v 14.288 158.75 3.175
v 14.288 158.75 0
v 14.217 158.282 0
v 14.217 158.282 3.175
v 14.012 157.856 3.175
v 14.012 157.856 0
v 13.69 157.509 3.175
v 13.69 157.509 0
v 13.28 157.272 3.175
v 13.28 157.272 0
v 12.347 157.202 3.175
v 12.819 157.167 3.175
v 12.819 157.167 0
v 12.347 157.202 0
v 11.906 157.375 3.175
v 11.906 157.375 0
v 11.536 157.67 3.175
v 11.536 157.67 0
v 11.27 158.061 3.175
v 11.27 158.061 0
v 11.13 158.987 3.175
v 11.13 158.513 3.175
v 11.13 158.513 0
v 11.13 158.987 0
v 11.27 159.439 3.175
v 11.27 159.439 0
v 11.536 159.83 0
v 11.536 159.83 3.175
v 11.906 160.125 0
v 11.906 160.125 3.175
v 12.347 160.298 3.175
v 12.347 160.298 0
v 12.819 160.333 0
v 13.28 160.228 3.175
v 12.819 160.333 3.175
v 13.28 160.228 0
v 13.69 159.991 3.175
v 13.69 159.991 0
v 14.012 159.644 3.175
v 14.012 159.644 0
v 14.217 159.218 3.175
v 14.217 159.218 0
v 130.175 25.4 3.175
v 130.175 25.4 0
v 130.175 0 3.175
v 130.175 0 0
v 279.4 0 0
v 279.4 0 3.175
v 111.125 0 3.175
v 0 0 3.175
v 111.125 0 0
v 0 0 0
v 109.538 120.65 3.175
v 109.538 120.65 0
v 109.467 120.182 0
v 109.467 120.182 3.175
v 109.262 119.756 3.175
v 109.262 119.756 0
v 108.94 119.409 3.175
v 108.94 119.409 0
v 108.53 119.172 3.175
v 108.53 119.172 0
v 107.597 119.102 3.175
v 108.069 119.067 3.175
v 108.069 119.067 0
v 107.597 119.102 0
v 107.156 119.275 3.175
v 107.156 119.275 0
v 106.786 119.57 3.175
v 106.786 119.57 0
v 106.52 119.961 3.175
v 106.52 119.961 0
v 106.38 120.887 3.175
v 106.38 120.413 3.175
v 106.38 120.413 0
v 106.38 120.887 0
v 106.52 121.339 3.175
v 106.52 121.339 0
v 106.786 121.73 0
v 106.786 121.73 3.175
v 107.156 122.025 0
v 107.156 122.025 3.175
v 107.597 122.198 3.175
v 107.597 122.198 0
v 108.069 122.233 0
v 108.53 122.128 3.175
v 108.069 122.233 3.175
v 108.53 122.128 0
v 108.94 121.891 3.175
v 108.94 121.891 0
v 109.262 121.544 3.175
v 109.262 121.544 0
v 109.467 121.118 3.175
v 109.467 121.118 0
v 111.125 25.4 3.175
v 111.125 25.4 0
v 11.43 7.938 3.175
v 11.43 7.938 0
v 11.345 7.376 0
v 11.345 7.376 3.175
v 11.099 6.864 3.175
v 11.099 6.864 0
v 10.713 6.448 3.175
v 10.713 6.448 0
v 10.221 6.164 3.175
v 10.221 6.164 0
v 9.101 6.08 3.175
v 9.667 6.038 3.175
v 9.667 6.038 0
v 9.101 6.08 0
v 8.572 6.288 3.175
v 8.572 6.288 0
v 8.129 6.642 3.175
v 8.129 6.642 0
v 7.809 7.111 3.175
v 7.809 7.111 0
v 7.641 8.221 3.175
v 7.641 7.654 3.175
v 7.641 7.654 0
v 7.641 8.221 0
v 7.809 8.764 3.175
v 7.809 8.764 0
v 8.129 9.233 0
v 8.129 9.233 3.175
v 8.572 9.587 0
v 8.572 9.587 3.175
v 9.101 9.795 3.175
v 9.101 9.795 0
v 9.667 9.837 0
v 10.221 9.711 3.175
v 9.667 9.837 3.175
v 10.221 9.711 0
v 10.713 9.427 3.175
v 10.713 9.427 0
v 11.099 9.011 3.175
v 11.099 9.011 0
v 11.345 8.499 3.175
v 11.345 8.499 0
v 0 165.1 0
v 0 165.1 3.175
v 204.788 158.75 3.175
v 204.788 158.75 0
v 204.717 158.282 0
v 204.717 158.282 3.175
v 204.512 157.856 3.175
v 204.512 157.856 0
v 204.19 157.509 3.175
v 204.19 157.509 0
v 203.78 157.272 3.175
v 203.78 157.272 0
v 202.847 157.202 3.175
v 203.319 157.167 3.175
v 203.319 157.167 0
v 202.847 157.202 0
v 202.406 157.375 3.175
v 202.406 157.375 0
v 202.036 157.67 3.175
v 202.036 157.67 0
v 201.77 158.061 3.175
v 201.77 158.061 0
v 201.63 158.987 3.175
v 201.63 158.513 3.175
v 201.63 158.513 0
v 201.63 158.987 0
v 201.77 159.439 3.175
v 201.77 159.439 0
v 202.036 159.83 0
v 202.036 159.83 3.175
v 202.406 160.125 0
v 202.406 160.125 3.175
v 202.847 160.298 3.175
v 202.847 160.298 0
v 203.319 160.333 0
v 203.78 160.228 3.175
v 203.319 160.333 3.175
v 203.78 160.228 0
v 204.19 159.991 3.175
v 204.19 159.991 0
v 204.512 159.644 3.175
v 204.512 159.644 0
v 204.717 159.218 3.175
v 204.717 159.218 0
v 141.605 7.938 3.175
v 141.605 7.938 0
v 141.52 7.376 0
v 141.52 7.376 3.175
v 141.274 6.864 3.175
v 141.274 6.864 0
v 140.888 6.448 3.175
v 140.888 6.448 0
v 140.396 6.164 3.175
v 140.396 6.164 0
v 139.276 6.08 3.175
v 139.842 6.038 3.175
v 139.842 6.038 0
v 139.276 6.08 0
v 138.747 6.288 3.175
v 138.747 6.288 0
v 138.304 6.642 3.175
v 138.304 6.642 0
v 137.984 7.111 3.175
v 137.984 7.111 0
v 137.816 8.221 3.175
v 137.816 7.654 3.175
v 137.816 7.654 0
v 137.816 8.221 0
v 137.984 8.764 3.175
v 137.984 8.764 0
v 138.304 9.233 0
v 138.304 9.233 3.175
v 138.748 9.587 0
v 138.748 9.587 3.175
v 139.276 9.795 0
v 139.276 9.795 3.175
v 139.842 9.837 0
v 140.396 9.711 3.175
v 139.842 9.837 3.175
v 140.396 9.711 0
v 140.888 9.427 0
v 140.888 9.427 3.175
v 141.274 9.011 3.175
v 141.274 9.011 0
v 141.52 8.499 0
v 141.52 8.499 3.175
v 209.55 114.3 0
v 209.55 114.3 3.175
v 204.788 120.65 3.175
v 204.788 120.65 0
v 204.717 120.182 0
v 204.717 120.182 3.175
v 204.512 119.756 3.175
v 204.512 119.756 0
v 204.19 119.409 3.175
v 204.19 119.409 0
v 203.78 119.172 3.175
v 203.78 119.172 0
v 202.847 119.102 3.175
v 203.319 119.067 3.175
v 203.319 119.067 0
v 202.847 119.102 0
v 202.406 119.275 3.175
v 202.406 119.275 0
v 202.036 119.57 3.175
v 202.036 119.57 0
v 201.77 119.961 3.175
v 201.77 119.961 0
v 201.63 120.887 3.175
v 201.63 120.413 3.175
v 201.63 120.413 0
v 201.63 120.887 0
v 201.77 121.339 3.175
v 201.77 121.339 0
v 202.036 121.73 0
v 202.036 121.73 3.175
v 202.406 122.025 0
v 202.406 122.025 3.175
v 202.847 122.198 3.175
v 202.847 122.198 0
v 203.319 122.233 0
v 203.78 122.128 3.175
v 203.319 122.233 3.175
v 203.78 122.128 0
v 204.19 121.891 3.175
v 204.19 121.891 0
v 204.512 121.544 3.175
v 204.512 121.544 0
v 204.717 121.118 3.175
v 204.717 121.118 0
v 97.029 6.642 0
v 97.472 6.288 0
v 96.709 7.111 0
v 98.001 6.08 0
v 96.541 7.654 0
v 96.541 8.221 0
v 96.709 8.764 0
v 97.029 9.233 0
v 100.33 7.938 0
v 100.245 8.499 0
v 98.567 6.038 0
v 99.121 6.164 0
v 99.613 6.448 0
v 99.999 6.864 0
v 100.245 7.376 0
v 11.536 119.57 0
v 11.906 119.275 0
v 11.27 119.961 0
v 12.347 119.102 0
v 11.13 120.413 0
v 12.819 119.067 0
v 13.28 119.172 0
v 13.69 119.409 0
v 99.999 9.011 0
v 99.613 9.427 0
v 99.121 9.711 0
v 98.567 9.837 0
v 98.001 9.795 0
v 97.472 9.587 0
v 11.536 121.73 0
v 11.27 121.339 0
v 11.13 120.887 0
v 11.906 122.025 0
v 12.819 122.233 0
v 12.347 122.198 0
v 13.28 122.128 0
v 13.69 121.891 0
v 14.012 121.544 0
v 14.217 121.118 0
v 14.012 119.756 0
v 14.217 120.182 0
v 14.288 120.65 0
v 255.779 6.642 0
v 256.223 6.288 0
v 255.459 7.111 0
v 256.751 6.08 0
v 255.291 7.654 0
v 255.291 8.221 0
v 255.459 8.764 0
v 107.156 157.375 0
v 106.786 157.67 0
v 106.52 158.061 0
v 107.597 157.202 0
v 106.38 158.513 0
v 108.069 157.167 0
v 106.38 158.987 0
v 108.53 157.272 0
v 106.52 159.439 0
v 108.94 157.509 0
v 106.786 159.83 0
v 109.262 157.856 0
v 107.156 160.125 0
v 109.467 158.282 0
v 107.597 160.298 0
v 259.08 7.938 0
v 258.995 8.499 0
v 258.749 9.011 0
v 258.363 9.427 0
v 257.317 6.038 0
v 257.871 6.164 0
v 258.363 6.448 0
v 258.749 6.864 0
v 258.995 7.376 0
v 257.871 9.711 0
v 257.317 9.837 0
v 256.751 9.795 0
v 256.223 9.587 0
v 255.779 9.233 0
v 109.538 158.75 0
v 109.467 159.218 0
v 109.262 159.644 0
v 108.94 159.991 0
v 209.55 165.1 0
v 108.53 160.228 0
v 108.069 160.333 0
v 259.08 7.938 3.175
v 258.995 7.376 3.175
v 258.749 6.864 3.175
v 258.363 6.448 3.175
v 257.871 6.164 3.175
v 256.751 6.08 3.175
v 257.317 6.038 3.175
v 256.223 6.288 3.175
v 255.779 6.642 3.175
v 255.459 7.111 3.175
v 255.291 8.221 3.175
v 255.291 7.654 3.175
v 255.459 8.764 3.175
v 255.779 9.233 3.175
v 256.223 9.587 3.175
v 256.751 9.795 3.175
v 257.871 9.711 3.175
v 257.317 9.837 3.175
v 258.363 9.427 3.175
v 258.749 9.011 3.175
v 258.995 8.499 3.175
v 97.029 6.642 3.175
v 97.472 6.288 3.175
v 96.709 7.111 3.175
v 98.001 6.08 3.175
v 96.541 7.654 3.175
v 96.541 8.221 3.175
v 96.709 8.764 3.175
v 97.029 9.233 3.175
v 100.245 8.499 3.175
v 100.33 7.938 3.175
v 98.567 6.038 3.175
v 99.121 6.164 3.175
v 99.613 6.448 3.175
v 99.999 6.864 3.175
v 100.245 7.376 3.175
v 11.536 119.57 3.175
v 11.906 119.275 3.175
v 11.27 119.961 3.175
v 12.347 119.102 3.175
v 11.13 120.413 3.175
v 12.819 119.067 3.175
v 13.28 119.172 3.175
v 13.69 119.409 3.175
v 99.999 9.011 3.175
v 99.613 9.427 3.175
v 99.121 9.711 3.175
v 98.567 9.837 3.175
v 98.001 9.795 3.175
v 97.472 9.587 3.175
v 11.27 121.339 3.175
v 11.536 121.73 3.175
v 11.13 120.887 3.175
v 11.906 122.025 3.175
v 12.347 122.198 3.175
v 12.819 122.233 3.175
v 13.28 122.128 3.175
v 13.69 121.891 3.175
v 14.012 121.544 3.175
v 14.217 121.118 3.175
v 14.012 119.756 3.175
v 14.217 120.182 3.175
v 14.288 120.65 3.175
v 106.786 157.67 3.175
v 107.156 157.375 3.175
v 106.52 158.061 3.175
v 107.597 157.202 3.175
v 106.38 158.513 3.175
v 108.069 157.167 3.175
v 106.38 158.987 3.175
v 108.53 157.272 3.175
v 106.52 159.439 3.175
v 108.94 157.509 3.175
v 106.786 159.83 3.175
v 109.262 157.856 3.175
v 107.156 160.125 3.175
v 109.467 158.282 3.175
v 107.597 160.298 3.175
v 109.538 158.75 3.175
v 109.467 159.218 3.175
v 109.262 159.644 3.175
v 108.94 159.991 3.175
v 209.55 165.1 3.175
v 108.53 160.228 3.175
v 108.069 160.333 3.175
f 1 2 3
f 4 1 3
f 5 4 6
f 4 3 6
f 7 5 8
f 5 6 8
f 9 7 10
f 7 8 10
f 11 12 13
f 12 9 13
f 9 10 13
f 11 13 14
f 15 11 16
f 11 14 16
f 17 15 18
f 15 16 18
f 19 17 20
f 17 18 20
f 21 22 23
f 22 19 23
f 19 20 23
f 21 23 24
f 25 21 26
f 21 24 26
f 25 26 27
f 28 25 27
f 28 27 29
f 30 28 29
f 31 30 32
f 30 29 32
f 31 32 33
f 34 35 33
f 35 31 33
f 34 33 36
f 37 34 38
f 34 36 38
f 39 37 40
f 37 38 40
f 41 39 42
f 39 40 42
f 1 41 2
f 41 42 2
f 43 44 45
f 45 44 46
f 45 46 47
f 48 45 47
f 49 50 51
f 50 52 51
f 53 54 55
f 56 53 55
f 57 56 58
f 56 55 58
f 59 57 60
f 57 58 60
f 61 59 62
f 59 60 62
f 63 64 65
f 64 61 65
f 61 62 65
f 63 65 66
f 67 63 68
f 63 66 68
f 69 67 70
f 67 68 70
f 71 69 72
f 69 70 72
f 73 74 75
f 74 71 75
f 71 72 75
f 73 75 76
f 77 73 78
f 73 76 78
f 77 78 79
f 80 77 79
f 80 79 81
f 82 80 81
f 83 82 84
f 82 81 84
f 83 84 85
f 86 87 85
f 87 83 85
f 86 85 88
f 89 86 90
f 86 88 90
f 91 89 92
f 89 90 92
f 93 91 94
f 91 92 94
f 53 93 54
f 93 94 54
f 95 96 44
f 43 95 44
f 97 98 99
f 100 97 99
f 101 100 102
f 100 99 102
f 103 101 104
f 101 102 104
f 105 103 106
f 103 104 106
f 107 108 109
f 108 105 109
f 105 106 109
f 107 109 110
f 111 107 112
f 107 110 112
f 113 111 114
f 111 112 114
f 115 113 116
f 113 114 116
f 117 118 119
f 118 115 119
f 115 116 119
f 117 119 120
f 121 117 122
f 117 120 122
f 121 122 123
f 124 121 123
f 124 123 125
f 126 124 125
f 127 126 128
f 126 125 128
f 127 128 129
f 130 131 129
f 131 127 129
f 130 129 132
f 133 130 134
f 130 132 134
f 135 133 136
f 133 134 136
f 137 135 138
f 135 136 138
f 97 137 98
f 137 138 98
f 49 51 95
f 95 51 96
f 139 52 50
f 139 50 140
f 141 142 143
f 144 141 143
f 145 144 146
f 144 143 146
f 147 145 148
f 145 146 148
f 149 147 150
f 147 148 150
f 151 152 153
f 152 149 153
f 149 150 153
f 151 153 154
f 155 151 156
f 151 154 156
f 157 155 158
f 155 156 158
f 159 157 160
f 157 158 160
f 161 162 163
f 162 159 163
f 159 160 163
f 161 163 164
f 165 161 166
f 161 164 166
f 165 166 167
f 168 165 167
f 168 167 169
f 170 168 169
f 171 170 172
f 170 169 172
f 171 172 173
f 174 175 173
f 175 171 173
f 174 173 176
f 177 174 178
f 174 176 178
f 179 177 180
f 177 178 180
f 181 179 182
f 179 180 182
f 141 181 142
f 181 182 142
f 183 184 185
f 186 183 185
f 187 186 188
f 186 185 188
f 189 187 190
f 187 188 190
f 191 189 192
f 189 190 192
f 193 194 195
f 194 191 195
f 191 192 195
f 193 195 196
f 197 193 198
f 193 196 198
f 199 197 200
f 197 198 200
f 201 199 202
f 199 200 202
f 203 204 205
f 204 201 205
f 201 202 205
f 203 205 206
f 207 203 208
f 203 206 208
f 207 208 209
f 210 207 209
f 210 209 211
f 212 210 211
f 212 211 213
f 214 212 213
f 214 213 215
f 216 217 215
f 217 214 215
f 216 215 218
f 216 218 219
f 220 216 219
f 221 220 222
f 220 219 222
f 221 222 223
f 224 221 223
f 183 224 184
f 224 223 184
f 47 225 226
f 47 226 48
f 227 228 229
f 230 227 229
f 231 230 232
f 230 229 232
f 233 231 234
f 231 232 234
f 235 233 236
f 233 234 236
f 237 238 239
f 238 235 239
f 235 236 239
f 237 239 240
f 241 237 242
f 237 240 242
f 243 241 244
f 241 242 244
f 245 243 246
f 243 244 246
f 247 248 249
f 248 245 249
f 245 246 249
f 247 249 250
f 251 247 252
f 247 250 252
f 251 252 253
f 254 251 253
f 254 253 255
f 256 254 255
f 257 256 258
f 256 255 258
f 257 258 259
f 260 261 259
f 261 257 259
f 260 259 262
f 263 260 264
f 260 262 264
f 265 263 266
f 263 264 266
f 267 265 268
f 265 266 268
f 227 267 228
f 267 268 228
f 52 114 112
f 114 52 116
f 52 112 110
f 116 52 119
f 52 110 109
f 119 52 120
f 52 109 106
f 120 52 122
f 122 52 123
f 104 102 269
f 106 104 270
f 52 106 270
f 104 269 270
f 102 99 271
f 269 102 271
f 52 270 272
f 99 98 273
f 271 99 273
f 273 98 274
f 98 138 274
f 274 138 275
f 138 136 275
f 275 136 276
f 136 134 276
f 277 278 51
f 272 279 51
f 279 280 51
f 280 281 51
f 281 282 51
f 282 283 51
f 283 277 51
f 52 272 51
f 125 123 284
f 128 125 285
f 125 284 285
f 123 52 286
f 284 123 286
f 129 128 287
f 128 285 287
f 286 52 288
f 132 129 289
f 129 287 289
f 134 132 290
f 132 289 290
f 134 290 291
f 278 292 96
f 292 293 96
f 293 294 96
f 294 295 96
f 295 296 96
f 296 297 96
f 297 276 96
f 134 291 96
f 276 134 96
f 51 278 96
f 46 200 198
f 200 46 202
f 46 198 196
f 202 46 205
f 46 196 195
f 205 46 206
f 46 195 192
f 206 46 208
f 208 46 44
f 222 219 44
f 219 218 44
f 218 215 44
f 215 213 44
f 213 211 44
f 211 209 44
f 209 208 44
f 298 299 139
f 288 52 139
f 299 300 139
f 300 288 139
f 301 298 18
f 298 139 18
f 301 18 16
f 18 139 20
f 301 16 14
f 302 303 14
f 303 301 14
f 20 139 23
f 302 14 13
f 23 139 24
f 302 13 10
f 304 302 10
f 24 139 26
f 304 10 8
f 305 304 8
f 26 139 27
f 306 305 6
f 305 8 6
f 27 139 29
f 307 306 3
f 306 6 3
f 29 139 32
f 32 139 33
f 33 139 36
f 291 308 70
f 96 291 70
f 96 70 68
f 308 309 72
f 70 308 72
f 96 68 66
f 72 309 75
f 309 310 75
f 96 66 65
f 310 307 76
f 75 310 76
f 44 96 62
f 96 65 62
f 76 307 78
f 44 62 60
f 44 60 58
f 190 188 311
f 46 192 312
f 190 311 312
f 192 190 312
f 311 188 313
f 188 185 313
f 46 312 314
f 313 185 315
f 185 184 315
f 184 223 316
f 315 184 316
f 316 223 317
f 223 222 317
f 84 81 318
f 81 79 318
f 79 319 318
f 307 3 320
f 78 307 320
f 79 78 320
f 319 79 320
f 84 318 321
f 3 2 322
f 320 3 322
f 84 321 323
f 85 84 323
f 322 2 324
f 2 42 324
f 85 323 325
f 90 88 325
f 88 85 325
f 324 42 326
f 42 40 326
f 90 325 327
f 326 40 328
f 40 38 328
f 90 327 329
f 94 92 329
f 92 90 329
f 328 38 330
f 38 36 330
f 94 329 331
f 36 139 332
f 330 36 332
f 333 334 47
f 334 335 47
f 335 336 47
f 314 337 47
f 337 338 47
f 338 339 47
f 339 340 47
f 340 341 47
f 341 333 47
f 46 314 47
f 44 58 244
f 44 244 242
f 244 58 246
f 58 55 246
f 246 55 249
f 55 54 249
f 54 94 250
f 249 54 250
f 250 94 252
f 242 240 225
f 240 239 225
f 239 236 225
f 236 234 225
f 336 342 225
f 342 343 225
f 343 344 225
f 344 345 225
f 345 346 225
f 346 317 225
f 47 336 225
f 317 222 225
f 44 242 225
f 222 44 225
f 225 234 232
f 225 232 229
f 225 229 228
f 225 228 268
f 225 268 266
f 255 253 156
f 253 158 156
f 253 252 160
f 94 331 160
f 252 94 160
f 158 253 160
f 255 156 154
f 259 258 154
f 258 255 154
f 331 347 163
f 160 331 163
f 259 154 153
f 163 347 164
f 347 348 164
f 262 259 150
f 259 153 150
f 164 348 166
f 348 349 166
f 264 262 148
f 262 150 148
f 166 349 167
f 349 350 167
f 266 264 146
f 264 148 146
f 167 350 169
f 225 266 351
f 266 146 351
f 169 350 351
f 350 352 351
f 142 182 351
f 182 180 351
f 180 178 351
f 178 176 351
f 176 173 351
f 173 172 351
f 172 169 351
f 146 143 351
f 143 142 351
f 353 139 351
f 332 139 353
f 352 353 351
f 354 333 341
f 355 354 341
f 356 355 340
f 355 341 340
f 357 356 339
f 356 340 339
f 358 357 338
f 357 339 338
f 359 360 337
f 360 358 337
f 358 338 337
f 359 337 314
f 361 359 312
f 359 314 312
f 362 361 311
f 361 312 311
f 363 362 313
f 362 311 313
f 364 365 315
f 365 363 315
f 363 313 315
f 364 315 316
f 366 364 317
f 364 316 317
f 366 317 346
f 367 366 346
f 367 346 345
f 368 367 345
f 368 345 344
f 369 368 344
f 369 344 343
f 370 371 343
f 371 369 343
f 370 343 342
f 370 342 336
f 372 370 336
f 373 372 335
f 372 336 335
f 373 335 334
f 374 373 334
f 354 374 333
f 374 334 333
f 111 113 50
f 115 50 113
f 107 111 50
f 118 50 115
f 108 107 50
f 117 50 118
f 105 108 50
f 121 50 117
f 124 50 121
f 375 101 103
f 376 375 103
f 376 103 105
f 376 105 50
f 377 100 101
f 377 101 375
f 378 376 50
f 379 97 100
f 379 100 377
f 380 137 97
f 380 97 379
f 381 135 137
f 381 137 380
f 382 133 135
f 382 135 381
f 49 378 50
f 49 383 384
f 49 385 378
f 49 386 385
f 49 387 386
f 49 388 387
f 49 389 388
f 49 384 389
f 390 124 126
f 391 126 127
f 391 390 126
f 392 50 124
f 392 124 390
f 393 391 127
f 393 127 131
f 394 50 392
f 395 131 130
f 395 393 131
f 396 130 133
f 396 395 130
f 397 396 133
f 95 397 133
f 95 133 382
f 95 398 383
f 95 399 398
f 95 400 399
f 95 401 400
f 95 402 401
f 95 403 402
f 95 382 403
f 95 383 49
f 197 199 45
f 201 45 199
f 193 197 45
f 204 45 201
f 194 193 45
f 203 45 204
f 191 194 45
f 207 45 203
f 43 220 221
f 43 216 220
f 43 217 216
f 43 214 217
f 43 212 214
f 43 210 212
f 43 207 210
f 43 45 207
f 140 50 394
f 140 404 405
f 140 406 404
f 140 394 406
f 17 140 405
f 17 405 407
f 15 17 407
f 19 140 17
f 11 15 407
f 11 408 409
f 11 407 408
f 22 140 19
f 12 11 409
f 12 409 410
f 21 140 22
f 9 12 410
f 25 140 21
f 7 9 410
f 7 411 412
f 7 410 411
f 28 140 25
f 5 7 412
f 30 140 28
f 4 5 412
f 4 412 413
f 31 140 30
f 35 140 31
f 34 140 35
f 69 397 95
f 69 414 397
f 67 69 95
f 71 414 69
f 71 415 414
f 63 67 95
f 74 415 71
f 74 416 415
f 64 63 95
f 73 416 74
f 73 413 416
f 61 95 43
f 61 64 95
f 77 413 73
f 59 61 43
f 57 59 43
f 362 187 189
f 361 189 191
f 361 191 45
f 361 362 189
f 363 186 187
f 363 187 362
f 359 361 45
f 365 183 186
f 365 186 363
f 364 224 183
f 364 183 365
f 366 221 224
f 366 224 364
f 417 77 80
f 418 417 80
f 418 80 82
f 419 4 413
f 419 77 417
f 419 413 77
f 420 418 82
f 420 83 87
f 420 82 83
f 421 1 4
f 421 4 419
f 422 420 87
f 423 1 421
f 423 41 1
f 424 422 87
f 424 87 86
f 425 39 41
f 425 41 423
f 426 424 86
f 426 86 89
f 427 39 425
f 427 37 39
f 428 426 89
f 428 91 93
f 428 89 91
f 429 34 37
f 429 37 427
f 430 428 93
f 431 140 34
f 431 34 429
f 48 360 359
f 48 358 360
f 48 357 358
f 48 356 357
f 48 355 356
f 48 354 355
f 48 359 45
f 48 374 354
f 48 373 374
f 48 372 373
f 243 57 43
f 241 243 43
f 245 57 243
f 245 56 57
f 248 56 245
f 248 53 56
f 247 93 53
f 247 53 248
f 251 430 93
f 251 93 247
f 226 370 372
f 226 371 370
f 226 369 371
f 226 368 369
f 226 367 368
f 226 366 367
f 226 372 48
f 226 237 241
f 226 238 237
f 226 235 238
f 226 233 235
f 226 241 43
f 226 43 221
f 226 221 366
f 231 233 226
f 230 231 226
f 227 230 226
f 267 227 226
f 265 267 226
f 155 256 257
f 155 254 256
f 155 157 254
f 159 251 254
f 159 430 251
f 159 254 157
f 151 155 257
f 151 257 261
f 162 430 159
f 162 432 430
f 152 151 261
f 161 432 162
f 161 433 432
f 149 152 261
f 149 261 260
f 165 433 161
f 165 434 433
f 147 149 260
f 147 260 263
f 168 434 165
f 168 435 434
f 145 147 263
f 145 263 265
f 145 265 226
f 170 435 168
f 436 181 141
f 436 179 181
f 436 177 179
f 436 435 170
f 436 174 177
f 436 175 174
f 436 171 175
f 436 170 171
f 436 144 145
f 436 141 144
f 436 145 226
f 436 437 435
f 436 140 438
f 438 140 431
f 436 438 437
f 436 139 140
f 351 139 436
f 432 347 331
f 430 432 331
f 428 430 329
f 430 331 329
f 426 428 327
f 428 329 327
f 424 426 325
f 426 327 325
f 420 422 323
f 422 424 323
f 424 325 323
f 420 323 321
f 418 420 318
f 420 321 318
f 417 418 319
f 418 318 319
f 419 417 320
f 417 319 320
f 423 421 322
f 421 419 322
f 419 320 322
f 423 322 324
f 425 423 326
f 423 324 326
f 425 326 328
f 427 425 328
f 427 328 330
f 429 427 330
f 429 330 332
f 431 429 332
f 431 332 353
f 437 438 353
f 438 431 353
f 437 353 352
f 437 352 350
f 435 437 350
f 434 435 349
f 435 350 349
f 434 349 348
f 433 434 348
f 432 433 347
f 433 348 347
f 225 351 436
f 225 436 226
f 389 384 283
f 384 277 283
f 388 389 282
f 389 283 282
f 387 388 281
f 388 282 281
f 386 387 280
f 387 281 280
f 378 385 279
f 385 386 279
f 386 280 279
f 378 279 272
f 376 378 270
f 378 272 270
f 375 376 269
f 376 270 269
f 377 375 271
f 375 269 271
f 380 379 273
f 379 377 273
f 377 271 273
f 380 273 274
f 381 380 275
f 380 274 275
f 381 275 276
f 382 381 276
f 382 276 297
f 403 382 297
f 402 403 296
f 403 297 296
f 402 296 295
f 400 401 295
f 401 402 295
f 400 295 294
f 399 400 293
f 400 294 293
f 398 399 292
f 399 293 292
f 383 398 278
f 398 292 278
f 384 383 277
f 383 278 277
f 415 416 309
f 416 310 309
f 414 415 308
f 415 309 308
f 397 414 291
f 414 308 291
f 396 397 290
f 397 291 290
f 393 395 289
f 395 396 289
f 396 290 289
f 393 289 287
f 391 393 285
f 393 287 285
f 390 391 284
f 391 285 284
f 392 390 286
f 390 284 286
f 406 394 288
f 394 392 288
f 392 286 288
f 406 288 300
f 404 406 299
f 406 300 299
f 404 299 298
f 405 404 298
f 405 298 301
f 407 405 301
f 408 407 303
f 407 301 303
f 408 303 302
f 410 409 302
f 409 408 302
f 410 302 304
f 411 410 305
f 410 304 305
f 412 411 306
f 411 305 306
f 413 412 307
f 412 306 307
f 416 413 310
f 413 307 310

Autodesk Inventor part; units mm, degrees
ref_plane "YZ Plane" through (0, 0, 0) normal (1, 0, 0) x (0, 1, 0)
ref_plane "XZ Plane" through (0, 0, 0) normal (0, 1, 0) x (-1, 0, 0)
ref_plane "XY Plane" through (0, 0, 0) normal (0, 0, 1) x (1, 0, 0)
sketch "Sketch1" plane through (0, 0, 0) normal (0, 0, 1) x (1, 0, 0)
  line L0 (0, 0) -> (279.4, 0)
  line L1 (0, 0) -> (0, 165.1)
  line L2 (0, 165.1) -> (209.55, 165.1)
  line L3 (209.55, 165.1) -> (209.55, 114.3)
  line L4 (209.55, 114.3) -> (279.4, 0)
  circle A0 centre (9.525, 7.9375) radius 1.905 projected
  circle A1 centre (98.425, 7.9375) radius 1.905 projected
  line L5 (111.125, 0) -> (111.125, 25.4)
  line L6 (111.125, 25.4) -> (130.175, 25.4)
  line L7 (130.175, 25.4) -> (130.175, 0)
  circle A2 centre (12.7, 158.75) radius 1.5875
  circle A3 centre (107.95, 158.75) radius 1.5875
  circle A4 centre (203.2, 158.75) radius 1.5875
  circle A5 centre (12.7, 120.65) radius 1.5875
  circle A6 centre (107.95, 120.65) radius 1.5875
  circle A7 centre (203.2, 120.65) radius 1.5875
  circle A8 centre (139.7, 7.9375) radius 1.905 projected
  circle A9 centre (257.175, 7.9375) radius 1.905 projected
  line L8 (133.35, 0) -> (133.35, 15.875) construction
  line L9 (133.35, 0) -> (266.7, 0) construction
  line L10 (266.7, 15.875) -> (266.7, 0) construction
  line L11 (133.35, 15.875) -> (266.7, 15.875) construction
  dimension "d0" = 279.4
  dimension "d1" = 165.1
  dimension "d2" = 209.55
  dimension "d3" = 50.8
  dimension "d6" = 19.05
  dimension "d7" = 25.4
  dimension "d8" = 12.7
  dimension "d9" = 3.175
  dimension "d12" = 95.25
  dimension "d15" = 38.1
  dimension "d18" = 12.7
  dimension "d19" = 6.35
extrude "Extrusion1" add sketch "Sketch1" along normal blind 3.175 contours L1 L2 L3 L4 L0 L7 L6 L5
properties part number "Hopper Left Side Leg" material "Polycarbonate, Clear"
